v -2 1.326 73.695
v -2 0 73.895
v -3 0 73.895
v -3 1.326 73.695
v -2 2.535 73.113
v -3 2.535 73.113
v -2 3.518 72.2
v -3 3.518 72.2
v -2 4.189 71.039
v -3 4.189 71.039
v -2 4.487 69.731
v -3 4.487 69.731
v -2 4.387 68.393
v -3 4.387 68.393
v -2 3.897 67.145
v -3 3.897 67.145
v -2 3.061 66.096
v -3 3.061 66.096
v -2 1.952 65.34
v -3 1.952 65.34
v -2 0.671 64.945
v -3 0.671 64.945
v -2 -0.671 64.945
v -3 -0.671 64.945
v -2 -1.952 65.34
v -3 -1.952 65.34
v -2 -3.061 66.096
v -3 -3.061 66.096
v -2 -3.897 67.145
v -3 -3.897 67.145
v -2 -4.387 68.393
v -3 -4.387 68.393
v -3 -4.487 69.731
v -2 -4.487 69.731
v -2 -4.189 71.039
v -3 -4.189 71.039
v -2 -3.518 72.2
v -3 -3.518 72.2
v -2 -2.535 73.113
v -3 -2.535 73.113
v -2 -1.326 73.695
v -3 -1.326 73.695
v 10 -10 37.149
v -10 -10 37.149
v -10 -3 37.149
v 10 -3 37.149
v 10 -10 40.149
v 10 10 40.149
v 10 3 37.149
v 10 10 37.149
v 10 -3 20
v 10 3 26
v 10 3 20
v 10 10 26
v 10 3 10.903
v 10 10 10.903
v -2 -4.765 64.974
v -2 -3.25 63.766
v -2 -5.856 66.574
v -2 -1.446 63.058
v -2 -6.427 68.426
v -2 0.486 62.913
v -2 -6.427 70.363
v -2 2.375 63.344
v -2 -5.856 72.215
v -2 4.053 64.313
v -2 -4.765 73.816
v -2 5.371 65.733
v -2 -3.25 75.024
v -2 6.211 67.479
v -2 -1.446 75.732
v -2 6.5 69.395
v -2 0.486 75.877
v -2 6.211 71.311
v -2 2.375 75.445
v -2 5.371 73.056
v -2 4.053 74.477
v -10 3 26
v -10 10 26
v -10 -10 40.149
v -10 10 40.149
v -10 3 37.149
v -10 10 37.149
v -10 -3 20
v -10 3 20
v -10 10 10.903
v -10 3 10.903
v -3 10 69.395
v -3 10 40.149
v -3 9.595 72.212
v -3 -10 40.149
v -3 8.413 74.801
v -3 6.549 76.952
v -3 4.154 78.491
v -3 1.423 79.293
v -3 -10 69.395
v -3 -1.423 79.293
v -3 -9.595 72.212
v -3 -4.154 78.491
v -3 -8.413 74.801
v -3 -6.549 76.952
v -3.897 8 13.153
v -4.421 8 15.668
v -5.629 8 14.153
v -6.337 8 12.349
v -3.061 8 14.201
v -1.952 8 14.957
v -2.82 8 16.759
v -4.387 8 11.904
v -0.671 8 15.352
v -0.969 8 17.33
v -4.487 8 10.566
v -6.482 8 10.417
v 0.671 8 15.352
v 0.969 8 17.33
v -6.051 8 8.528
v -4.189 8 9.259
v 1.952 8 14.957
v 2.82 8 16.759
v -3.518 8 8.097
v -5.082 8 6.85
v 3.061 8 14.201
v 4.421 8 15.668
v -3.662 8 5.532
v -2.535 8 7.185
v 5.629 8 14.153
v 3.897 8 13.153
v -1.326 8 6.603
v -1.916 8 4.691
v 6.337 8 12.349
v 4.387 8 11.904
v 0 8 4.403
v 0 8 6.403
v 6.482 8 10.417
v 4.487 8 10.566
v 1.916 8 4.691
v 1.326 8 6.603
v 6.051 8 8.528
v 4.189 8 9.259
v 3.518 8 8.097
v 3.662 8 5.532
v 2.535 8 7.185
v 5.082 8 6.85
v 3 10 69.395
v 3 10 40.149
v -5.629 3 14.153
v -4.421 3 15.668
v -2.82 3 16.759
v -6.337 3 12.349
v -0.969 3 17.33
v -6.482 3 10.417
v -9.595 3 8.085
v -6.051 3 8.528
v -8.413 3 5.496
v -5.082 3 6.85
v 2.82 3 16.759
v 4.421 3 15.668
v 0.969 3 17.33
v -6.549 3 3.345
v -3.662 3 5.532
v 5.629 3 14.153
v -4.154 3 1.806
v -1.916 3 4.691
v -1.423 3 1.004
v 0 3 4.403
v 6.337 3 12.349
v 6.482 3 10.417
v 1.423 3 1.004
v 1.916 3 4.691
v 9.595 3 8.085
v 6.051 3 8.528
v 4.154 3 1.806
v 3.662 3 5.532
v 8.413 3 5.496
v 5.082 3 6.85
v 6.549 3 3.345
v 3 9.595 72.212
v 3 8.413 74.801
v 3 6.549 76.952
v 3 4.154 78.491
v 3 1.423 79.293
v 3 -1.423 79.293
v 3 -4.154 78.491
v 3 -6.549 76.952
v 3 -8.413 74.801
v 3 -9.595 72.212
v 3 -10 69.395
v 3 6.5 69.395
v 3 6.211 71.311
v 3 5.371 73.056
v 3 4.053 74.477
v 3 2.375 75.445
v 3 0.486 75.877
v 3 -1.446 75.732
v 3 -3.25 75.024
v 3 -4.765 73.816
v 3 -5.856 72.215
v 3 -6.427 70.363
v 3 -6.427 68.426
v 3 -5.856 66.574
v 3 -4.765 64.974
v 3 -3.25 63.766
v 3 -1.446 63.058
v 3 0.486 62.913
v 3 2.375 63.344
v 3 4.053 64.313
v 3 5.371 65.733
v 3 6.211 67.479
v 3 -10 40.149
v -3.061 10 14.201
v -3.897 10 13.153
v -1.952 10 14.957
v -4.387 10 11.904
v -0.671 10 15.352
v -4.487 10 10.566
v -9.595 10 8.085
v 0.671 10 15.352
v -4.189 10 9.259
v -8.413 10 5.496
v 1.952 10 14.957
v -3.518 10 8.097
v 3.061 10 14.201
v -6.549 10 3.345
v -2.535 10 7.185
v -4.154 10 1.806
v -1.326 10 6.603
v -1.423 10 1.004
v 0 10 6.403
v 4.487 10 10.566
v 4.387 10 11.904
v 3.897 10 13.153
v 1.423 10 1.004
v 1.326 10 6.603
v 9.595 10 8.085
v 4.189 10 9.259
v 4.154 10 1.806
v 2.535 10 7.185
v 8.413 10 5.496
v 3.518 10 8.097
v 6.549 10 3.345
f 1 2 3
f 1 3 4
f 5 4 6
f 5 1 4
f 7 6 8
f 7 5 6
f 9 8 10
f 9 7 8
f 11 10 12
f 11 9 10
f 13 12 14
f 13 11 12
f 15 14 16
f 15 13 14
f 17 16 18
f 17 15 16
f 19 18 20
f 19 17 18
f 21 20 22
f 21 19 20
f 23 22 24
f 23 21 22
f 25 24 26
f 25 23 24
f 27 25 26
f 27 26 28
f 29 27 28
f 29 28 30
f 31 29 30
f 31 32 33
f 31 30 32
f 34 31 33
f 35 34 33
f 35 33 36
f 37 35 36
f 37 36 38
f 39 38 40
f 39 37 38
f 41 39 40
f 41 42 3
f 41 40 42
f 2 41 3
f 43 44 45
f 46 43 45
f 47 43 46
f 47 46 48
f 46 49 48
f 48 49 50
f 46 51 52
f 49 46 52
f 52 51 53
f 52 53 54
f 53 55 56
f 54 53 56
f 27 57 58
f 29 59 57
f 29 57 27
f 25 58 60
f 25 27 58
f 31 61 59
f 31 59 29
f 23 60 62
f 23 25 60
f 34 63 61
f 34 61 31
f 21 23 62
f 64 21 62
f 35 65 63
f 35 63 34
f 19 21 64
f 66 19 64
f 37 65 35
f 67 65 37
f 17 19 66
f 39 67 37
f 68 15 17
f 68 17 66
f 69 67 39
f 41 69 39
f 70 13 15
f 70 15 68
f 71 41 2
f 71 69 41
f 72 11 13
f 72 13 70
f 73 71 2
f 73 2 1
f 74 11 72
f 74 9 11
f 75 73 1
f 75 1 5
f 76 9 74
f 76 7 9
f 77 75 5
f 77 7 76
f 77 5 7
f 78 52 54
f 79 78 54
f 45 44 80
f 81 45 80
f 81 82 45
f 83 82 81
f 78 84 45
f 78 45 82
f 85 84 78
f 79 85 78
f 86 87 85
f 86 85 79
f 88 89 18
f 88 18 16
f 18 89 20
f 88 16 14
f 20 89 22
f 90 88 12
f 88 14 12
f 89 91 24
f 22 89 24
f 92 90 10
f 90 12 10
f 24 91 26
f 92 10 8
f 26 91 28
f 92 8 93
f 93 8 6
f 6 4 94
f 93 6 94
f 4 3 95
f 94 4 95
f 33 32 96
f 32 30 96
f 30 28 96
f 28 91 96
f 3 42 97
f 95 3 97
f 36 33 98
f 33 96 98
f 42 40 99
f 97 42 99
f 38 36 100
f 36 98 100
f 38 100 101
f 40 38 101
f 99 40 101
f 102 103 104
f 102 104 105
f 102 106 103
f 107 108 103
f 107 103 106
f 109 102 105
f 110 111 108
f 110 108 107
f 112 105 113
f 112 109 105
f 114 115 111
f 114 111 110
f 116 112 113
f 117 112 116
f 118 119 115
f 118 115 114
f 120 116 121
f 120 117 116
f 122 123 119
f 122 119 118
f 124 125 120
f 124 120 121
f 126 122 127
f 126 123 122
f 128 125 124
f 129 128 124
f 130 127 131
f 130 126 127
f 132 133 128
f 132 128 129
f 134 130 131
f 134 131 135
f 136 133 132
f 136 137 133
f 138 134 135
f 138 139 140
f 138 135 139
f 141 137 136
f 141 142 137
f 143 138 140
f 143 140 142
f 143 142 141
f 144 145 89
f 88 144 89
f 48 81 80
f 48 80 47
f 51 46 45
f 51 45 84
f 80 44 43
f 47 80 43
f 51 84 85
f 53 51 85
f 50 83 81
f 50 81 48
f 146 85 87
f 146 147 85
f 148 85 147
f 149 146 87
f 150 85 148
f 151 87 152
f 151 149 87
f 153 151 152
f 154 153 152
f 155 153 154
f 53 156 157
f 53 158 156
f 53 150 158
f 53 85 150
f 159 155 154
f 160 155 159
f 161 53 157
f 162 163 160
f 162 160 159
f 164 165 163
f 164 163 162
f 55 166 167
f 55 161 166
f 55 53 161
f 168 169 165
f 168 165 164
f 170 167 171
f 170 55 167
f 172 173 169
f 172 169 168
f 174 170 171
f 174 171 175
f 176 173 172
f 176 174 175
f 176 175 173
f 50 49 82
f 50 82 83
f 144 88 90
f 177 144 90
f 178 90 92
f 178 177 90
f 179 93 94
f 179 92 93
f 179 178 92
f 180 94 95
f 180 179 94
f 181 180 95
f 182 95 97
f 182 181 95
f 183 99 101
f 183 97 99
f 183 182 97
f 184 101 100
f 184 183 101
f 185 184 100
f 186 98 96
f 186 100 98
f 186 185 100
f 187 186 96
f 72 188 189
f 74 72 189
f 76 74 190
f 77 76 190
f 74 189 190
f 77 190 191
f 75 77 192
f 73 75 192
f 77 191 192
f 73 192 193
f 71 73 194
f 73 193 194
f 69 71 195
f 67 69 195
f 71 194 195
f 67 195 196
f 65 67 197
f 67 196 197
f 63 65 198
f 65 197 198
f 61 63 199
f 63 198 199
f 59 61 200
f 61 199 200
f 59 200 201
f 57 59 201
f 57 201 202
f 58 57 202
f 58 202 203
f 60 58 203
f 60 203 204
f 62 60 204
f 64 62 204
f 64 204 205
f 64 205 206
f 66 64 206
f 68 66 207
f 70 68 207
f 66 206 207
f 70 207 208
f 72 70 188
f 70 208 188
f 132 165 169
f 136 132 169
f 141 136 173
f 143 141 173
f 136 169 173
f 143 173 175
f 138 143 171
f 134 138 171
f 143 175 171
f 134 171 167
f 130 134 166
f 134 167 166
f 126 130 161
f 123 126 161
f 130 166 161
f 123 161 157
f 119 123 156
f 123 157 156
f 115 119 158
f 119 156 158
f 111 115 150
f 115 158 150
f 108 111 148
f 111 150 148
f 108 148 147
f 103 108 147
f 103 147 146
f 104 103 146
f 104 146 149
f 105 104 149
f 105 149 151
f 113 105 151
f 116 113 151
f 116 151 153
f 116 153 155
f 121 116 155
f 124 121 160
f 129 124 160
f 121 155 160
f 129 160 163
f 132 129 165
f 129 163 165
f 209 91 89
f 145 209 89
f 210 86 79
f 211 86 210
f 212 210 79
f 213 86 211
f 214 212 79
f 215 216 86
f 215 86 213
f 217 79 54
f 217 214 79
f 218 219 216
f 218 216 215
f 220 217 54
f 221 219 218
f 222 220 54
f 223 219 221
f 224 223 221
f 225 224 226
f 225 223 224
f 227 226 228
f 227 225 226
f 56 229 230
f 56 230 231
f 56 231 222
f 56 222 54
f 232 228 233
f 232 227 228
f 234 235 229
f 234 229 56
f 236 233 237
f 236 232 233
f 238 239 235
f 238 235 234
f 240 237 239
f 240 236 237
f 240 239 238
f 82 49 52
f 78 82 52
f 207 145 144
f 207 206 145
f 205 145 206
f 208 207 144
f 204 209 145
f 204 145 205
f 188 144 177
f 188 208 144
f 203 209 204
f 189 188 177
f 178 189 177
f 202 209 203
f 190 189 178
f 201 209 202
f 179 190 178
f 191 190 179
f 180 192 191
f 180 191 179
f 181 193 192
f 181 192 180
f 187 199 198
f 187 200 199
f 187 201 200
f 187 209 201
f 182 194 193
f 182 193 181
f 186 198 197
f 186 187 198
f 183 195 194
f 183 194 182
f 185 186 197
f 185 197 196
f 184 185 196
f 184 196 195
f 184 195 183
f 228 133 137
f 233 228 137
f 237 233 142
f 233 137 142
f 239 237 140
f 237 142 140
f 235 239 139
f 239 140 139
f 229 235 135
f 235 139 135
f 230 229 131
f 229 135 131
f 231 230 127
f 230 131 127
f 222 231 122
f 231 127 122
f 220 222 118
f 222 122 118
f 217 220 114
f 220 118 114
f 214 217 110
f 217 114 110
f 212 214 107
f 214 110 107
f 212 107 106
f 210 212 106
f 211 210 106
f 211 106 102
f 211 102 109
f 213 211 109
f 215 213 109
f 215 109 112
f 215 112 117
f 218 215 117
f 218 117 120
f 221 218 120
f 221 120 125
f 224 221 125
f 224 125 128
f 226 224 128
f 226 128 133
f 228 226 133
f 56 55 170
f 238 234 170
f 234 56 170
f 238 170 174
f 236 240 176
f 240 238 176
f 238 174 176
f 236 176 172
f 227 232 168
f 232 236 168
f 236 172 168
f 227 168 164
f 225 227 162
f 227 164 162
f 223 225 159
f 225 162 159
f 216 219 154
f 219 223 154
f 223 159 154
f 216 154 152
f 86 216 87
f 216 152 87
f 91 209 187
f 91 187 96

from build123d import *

# Parameters (mm, degrees)
SKETCH_1_W          = 20
SKETCH_1_H          = 20
EXTRUDE_1_DEPTH     = 80.297387422
SKETCH_7_W          = 11.148693711
SKETCH_7_H          = 7
CUT_EXTRUDE_6_DEPTH = 34
SKETCH_2_R          = 6.5
CUT_EXTRUDE_1_DEPTH = 5
SKETCH_3_R          = 4.5
CUT_EXTRUDE_2_DEPTH = 29
MOVE_BODY_1_ANGLE   = 90
SKETCH_9_W          = 7
SKETCH_9_H          = 39.245987558
CUT_EXTRUDE_7_DEPTH = 34
SKETCH_10_R         = 6.5
CUT_EXTRUDE_8_DEPTH = 5


# Read off the part's stored shape, not the designer's step: 교차3
with BuildPart() as part:
    # 스케치1 → 보스-돌출1 (new body)
    with BuildSketch(Plane.XY):
        Rectangle(SKETCH_1_W, SKETCH_1_H)
    extrude(amount=EXTRUDE_1_DEPTH)

    # 스케치7 → 컷-돌출6 (cut)
    with BuildSketch(Plane(origin=(10, 0, 0), x_dir=(0, 0, -1), z_dir=(1, 0, 0))):
        Polygon((-20, -3), (-20, 3), (0, 3), (0, -3), (0, -10), (-37.148693711, -10), (-37.148693711, -3), align=None)
        with Locations((-31.574346855, 6.5)):
            Rectangle(SKETCH_7_W, SKETCH_7_H)
    extrude(amount=-CUT_EXTRUDE_6_DEPTH, mode=Mode.SUBTRACT)

    # 스케치2 → 컷-돌출1 (cut)
    with BuildSketch(Plane(origin=(0, 3, 0), x_dir=(-1, 0, 0), z_dir=(0, -1, 0))):
        with Locations(Location((0, -10.902706153, 0), (0, 0, 90))):
            Circle(SKETCH_2_R)
    cut_extrude_1 = extrude(amount=-CUT_EXTRUDE_1_DEPTH, mode=Mode.SUBTRACT)

    # 스케치3 → 컷-돌출2 (cut)
    with BuildSketch(Plane(origin=(0, -10, 0), x_dir=(-1, 0, 0), z_dir=(0, -1, 0))):
        with Locations(Location((0, -10.902706153, 0), (0, 0, 90))):
            Circle(SKETCH_3_R)
        with BuildLine():
            Line((-21.262122506, -10.902706153), (-10, -10.902706153))
            ThreePointArc((-10, -10.902706153), (0, -0.902706153), (10, -10.902706153))
            Line((10, -10.902706153), (21.262122506, -10.902706153))
            ThreePointArc((21.262122506, -10.902706153), (0, 10.359416353), (-21.262122506, -10.902706153))
        make_face()
    cut_extrude_2 = extrude(amount=-CUT_EXTRUDE_2_DEPTH, mode=Mode.SUBTRACT)

    # 대칭 복사6: 컷-돌출1, 컷-돌출2 across plane
    add(cut_extrude_1.mirror(Plane.XY.offset(40.148693711)), mode=Mode.SUBTRACT)
    add(cut_extrude_2.mirror(Plane.XY.offset(40.148693711)), mode=Mode.SUBTRACT)


with BuildPart() as body_2:
    # 교차3: the piece on the far side of the plane
    add(part.part)
    split(bisect_by=Plane.XY.offset(40.148693711), keep=Keep.BOTTOM)


with BuildPart() as part_1:
    add(part.part)

    # 교차3
    split(bisect_by=Plane.XY.offset(40.148693711), keep=Keep.TOP)


with BuildPart() as part_2:
    # Move Body 1: moved
    add(part_1.part.rotate(Axis((0, 0, 0), (0, 0, 1)), MOVE_BODY_1_ANGLE))

    # 스케치9 → 컷-돌출7 (cut)
    with BuildSketch(Plane.XZ.offset(10)):
        with Locations((6.5, 59.77168749)):
            Rectangle(SKETCH_9_W, SKETCH_9_H)
        with Locations((-6.5, 59.77168749)):
            Rectangle(SKETCH_9_W, SKETCH_9_H)
    extrude(amount=-CUT_EXTRUDE_7_DEPTH, mode=Mode.SUBTRACT)

    # 스케치10 → 컷-돌출8 (cut)
    with BuildSketch(Plane(origin=(3, 0, 0), x_dir=(0, 0, -1), z_dir=(1, 0, 0))):
        with Locations(Location((-69.394681269, 0, 0), (0, 0, 90))):
            Circle(SKETCH_10_R)
    extrude(amount=-CUT_EXTRUDE_8_DEPTH, mode=Mode.SUBTRACT)


solid = Compound([body_2.part, part_2.part])
